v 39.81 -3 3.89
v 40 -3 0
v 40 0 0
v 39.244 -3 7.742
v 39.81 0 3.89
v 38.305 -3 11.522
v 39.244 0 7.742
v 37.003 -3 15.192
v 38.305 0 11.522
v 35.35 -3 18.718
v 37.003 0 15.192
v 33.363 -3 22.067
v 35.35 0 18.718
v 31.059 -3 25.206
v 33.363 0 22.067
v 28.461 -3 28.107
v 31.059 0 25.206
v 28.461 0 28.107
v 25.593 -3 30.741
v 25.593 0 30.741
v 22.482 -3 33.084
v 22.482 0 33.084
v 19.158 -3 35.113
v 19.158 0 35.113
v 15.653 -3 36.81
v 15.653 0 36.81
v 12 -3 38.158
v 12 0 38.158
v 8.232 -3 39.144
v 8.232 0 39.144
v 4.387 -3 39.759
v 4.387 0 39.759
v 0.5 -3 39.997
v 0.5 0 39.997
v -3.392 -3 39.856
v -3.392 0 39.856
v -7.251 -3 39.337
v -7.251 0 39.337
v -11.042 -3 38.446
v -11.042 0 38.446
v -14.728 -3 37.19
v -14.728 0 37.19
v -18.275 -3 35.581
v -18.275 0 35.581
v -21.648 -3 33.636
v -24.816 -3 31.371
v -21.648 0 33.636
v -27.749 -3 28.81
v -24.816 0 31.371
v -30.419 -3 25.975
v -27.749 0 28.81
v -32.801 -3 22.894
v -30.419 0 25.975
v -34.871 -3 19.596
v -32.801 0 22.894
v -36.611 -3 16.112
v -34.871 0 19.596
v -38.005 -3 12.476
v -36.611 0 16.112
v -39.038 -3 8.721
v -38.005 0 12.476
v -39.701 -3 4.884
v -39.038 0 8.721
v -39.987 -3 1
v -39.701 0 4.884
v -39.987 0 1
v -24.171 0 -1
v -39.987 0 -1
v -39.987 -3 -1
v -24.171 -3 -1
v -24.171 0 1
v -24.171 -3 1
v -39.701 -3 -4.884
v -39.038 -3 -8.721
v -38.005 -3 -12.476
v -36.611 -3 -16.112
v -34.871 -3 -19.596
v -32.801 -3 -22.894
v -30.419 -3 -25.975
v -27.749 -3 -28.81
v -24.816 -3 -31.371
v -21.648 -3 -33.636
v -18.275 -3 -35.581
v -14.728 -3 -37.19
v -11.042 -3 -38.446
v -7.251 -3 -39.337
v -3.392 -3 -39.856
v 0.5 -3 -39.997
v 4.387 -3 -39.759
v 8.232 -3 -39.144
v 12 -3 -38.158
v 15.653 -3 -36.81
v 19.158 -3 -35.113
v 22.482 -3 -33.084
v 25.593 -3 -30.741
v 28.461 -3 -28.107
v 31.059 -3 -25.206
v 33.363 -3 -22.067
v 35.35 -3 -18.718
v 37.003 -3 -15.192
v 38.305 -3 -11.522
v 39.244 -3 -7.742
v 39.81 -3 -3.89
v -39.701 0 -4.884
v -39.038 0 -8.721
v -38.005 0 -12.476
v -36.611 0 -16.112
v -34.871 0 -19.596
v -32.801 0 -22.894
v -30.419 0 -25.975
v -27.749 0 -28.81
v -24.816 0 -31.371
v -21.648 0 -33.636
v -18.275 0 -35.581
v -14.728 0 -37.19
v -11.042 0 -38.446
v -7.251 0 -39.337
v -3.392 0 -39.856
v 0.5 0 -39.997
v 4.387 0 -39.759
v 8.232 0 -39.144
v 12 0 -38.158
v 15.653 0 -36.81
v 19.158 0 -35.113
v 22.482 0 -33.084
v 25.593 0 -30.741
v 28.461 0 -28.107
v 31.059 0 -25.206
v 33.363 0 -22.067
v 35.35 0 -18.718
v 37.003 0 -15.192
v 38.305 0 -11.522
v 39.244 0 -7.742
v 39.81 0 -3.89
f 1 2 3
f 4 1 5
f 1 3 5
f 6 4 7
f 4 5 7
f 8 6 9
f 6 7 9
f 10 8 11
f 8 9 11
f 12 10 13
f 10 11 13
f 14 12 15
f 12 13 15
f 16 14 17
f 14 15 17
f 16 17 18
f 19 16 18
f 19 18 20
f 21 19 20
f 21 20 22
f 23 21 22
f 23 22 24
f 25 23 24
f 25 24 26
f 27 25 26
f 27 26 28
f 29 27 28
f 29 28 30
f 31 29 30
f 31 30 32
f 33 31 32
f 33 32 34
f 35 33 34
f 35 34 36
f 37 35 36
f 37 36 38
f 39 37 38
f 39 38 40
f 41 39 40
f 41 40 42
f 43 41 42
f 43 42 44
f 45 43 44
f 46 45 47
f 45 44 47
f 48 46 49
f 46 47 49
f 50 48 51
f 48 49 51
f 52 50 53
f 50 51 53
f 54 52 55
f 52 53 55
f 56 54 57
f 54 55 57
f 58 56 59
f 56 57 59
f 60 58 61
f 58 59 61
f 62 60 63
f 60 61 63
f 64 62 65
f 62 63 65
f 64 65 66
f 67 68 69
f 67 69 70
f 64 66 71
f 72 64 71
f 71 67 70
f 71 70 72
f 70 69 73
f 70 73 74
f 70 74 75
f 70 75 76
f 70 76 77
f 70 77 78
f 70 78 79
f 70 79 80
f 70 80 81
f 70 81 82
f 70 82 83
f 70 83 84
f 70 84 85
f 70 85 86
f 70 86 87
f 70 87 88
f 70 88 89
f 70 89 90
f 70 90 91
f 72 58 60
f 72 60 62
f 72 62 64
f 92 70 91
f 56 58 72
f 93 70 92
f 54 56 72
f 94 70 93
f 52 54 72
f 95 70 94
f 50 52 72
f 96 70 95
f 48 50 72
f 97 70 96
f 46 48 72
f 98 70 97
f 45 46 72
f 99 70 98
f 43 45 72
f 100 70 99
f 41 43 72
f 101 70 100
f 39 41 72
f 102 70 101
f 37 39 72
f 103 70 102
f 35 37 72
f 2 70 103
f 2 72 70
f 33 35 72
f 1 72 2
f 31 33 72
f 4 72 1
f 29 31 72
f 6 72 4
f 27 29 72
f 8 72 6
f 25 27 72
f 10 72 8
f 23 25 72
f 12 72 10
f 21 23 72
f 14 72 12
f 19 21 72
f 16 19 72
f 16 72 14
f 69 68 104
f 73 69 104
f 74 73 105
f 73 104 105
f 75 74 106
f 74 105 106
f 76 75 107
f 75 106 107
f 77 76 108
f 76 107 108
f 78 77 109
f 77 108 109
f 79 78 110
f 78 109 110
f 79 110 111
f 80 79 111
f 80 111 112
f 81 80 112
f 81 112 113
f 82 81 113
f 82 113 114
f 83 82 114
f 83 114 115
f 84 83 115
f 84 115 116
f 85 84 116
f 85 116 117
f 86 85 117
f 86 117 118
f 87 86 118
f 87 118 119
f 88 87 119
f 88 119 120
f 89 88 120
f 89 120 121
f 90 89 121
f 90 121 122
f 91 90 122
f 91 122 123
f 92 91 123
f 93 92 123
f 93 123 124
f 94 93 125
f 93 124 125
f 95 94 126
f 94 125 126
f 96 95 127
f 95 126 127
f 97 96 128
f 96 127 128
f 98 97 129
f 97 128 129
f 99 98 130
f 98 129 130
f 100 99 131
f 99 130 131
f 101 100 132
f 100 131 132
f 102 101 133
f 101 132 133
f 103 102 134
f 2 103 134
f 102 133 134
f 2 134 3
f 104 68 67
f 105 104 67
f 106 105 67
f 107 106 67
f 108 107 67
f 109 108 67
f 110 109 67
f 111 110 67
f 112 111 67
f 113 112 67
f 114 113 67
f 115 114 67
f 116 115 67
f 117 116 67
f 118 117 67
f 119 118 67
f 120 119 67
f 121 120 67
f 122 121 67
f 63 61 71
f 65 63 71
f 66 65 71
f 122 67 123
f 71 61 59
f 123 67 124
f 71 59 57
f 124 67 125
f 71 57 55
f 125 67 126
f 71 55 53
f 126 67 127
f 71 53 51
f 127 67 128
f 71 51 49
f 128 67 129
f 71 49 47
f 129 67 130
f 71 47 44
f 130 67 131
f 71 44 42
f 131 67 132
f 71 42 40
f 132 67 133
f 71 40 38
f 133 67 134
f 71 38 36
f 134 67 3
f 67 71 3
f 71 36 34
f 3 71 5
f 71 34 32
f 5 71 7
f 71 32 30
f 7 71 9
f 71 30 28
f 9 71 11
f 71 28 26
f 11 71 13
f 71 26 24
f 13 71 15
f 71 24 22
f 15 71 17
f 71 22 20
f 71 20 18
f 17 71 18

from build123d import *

# Parameters (mm, degrees)
F0_R     = 40
F1_DEPTH = 3
F2_W     = 33.162359
F2_H     = 1
F3_DEPTH = 24.9
F4_DEPTH = 25


with BuildPart() as f1:
    # F0 (on Front) → F1 (new body)
    with BuildSketch(Plane.XZ):
        Circle(F0_R)
    extrude(amount=F1_DEPTH)

    # F2 (on Front) → F3 (cut)
    with BuildSketch(Plane.XZ):
        with Locations((-40.752544, 0.5)):
            Rectangle(F2_W, F2_H)
    extrude(amount=F3_DEPTH, mode=Mode.SUBTRACT)

    # F2 (on Front) → F4 (cut)
    with BuildSketch(Plane.XZ):
        with Locations((-40.752544, 0.5)):
            Rectangle(F2_W, F2_H)
        with Locations((-40.752544, -0.5)):
            Rectangle(F2_W, F2_H)
    extrude(amount=F4_DEPTH, mode=Mode.SUBTRACT)


solid = f1.part
